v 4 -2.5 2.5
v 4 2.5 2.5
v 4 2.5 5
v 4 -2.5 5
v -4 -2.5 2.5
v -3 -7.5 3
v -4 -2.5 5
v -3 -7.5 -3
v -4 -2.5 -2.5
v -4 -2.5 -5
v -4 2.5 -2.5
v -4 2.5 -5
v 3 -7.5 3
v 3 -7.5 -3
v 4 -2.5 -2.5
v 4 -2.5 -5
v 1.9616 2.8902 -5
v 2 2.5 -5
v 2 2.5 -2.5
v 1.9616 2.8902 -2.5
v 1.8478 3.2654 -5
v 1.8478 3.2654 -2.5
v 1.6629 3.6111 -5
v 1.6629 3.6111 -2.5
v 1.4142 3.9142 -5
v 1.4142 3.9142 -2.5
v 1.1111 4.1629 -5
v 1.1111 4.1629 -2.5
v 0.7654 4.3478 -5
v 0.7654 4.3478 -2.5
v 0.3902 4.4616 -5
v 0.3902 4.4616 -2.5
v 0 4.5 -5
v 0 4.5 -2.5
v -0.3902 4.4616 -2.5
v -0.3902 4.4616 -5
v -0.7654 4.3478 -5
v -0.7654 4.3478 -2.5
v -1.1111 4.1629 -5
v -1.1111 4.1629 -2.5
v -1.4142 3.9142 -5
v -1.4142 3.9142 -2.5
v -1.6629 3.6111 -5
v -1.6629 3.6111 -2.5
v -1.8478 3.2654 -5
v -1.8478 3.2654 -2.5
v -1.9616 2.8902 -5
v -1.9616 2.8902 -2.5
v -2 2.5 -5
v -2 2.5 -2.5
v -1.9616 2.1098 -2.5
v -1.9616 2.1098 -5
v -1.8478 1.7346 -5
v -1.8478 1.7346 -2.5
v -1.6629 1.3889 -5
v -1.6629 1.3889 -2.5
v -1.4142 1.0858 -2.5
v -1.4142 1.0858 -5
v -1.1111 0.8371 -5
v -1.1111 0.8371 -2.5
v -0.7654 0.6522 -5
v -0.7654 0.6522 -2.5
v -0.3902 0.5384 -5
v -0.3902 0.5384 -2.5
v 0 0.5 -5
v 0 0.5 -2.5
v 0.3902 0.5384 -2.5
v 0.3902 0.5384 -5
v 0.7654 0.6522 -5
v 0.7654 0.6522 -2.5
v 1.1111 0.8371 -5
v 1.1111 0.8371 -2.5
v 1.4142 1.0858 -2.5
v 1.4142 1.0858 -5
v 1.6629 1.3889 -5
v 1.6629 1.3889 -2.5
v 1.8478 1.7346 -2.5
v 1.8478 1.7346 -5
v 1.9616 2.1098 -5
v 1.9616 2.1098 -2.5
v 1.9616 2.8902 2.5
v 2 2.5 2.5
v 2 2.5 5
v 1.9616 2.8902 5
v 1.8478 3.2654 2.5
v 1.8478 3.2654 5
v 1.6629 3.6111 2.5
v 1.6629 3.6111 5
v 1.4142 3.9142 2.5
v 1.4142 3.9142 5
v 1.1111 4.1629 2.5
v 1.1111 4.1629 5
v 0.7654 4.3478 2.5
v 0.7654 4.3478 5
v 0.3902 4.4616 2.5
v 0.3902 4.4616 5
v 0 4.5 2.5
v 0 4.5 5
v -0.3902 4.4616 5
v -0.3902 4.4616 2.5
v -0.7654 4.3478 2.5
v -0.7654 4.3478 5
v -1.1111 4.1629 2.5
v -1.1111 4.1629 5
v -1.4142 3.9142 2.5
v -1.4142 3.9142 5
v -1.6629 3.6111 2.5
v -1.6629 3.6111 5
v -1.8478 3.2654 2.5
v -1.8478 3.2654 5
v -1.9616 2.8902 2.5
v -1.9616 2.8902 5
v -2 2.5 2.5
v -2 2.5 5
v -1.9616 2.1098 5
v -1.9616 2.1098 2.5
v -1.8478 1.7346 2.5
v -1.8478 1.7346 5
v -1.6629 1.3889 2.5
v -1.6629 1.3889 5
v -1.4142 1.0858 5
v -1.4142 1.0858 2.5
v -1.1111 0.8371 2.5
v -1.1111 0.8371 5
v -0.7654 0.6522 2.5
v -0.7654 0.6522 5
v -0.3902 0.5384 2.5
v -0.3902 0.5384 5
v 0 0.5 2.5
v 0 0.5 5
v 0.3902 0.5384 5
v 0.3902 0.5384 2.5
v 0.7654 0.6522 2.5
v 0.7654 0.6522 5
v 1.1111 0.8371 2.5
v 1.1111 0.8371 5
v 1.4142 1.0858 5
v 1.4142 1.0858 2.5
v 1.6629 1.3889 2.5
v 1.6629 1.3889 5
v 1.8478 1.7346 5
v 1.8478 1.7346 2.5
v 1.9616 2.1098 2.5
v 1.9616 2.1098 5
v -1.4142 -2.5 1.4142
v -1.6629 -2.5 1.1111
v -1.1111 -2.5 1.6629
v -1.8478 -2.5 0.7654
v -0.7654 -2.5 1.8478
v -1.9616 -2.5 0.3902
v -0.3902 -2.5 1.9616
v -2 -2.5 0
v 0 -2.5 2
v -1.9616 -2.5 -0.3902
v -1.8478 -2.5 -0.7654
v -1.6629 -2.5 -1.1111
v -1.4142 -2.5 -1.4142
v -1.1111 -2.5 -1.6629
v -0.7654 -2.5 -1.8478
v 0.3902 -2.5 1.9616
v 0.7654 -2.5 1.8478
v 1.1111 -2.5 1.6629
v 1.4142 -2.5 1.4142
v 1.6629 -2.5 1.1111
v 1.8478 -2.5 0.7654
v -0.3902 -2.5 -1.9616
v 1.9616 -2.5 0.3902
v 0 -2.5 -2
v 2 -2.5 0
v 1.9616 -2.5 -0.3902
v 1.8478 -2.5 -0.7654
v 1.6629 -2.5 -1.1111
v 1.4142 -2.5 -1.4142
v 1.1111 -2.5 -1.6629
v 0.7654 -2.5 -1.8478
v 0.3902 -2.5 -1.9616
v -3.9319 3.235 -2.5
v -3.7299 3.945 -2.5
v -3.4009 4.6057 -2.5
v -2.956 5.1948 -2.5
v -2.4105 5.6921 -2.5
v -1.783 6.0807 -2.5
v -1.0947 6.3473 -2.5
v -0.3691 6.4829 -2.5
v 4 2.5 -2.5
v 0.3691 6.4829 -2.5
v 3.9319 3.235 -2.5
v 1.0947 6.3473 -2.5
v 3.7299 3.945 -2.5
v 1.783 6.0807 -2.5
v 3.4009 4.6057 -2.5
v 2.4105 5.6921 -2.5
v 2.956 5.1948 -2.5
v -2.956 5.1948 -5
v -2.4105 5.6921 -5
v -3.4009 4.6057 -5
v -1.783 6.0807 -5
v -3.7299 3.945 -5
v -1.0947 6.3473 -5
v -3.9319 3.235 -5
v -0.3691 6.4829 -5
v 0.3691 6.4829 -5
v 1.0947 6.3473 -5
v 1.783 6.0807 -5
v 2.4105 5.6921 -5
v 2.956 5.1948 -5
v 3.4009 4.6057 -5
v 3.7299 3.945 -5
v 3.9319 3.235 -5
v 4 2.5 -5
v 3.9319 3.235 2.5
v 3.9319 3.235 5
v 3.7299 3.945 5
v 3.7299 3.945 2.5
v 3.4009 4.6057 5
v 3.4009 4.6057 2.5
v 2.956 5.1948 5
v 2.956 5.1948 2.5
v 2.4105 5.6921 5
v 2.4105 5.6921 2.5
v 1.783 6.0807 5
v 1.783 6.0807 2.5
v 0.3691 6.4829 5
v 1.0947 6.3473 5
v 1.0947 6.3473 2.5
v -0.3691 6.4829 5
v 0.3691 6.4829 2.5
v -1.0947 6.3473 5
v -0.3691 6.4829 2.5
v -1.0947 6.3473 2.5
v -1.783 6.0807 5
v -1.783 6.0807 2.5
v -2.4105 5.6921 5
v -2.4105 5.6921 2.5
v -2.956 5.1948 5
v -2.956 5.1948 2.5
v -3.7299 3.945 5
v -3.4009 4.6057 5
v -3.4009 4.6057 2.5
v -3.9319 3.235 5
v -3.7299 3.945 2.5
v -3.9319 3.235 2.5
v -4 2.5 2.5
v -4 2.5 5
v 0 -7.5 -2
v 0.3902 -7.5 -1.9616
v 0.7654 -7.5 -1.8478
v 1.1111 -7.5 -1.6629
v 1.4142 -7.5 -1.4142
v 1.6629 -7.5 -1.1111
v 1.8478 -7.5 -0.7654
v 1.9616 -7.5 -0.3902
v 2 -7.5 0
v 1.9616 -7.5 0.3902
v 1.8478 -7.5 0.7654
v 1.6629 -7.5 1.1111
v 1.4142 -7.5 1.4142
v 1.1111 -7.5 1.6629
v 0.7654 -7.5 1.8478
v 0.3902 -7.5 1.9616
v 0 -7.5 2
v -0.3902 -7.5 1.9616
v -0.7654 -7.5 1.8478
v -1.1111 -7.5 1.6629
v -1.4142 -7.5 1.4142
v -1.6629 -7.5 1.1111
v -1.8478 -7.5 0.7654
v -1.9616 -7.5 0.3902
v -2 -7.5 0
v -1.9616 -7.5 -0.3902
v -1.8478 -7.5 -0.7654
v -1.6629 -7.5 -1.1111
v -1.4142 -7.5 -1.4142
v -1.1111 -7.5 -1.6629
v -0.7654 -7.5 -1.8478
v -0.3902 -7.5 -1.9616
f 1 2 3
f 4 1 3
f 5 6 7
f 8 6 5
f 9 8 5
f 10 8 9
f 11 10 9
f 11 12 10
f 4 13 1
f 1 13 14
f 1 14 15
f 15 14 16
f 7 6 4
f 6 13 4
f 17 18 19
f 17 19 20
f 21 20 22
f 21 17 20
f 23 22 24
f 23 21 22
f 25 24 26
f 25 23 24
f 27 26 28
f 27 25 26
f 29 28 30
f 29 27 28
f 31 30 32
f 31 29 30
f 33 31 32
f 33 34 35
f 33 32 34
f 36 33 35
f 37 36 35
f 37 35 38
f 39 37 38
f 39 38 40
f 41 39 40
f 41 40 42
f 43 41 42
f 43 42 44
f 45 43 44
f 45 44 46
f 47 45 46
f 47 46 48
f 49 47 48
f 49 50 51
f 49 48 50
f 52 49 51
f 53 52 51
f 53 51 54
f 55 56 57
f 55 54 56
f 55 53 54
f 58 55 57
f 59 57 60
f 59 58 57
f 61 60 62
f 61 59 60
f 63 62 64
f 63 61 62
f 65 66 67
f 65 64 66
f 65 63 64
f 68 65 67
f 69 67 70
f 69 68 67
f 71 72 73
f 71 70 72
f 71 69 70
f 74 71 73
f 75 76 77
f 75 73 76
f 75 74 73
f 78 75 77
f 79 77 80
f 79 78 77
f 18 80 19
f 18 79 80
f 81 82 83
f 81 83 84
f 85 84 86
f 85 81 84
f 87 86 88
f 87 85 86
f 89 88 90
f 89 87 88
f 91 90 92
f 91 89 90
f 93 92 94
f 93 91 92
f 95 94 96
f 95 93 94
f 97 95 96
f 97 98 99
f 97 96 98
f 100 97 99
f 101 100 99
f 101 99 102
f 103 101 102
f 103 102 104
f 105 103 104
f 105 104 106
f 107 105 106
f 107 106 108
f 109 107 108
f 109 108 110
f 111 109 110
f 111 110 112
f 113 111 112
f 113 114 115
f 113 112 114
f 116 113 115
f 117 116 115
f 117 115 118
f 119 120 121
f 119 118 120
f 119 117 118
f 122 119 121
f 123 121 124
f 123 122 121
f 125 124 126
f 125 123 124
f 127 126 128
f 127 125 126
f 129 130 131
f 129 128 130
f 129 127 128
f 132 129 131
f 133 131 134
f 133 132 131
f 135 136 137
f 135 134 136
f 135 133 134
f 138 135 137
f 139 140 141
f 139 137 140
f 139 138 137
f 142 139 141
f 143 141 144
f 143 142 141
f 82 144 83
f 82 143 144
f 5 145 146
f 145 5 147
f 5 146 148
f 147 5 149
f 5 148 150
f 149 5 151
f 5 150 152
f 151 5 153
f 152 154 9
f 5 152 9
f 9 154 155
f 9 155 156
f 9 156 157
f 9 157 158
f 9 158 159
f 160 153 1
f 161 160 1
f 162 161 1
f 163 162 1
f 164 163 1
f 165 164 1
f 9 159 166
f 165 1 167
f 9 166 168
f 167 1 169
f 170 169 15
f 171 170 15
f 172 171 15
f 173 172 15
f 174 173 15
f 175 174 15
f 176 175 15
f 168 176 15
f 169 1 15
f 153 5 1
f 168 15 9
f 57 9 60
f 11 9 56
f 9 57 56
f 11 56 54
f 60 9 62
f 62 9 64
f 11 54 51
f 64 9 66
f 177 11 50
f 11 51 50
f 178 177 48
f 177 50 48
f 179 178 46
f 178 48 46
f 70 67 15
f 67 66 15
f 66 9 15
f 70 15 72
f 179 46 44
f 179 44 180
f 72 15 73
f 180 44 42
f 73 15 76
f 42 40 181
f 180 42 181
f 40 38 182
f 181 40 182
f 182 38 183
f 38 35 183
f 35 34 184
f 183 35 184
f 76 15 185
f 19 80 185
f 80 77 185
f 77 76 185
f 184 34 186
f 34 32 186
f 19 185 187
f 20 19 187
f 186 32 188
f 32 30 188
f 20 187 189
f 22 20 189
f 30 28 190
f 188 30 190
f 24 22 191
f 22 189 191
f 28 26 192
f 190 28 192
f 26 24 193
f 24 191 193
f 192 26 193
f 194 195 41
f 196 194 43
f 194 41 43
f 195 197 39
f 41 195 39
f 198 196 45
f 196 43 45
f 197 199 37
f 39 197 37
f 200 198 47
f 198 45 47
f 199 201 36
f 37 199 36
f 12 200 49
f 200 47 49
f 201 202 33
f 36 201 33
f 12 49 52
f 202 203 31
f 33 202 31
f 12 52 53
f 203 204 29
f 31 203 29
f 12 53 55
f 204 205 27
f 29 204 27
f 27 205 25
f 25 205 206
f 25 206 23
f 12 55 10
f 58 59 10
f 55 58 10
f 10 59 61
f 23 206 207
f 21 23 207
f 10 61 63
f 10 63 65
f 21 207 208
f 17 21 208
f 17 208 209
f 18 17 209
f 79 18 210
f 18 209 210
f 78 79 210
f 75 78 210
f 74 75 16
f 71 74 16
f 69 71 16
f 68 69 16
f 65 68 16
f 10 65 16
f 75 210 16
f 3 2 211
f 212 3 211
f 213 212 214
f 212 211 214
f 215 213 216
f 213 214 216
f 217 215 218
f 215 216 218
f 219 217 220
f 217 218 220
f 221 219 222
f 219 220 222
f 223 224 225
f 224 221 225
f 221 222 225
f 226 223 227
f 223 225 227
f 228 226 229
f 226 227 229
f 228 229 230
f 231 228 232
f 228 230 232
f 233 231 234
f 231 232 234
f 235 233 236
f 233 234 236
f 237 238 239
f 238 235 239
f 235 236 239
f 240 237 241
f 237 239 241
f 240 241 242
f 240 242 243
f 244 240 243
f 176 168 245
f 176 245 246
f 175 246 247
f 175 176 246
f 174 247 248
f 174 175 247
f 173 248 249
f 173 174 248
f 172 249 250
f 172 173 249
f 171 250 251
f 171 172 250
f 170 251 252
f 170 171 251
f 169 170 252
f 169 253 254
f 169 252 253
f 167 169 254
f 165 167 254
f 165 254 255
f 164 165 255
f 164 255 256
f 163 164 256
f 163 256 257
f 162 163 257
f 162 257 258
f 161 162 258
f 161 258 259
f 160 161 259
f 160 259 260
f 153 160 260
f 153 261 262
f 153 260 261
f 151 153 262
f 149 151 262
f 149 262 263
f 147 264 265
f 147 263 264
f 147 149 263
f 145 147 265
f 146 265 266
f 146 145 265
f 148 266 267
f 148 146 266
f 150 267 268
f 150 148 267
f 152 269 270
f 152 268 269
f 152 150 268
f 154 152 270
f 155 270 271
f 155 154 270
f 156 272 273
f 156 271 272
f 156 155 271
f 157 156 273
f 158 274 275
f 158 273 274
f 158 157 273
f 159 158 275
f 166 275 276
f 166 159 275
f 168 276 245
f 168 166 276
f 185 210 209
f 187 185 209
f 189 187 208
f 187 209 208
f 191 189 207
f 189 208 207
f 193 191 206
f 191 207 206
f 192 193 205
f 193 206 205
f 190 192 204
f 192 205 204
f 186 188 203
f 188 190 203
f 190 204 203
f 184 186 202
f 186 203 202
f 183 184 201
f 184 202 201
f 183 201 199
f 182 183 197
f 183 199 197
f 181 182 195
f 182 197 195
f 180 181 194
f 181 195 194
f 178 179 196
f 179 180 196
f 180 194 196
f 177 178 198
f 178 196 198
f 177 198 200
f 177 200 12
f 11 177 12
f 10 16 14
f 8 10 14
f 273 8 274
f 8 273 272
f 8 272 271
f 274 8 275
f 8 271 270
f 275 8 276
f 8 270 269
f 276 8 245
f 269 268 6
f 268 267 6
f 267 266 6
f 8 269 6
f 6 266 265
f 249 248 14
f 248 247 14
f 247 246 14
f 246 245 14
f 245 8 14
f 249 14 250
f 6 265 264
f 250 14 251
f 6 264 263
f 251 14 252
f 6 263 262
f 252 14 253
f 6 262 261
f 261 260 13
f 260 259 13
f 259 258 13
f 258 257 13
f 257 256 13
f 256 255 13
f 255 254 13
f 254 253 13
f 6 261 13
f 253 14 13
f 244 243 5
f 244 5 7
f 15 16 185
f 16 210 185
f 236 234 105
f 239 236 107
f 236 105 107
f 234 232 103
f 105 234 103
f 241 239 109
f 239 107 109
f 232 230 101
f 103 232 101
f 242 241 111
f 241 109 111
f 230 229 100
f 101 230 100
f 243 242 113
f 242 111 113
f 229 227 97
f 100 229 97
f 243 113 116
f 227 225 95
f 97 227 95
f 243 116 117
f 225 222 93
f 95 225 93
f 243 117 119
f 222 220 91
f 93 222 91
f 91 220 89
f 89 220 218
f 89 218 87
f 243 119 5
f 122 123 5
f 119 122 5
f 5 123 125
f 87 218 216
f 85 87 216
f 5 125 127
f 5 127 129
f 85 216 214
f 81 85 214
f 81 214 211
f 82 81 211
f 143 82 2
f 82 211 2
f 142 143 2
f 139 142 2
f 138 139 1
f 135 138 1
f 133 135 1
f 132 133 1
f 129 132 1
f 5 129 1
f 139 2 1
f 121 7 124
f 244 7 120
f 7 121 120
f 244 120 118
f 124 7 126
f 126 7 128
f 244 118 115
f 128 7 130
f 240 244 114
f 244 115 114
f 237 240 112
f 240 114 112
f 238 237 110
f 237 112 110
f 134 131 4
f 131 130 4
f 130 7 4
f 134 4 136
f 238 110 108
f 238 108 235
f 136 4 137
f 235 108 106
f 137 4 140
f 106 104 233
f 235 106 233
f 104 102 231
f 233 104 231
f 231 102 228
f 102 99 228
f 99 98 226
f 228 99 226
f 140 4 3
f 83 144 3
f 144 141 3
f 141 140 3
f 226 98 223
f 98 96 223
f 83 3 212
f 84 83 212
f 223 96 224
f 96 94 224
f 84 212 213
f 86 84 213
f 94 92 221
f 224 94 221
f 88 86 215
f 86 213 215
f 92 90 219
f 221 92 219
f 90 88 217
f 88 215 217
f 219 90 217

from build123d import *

# Parameters (mm, degrees)
BOSS_EXTRUDE1_DEPTH     = 4
CUT_EXTRUDE1_DEPTH      = 14.124404748
CUT_EXTRUDE1_DEPTH_BACK = 14.124404748
SKETCH2_R               = 2
CUT_EXTRUDE2_DEPTH      = 14.124404748
CUT_EXTRUDE2_DEPTH_BACK = 14.124404748
CUT_EXTRUDE3_DEPTH      = 10.861541462
CUT_EXTRUDE3_DEPTH_BACK = 10.861541462
CUT_EXTRUDE4_DEPTH      = 16.394804318
CUT_EXTRUDE4_DEPTH_BACK = 16.394804318
SKETCH8_R               = 2


with BuildPart() as part:
    # Sketch1 → Boss-Extrude1 (new, symmetric)
    with BuildSketch(Plane(origin=(0, 0, 0), x_dir=(0, 0, -1), z_dir=(1, 0, 0))):
        Polygon((2.5, 7.5), (5, 7.5), (5, -2.5), (3, -7.5), (-3, -7.5), (-5, -2.5), (-5, 7.5), (-2.5, 7.5), (-2.5, -2.5), (2.5, -2.5), align=None)
    extrude(amount=BOSS_EXTRUDE1_DEPTH, both=True)

    # Sketch2 → Cut-Extrude1 (cut, two sides: drawn at the far end of the back side and taken through both)
    with BuildSketch(Plane.XY.offset(5).offset(-CUT_EXTRUDE1_DEPTH_BACK)):
        with Locations((0, 2.5)):
            Circle(SKETCH2_R)
    extrude(amount=CUT_EXTRUDE1_DEPTH + CUT_EXTRUDE1_DEPTH_BACK, mode=Mode.SUBTRACT)

    # Sketch3 → Cut-Extrude2 (cut, two sides: drawn at the far end of the back side and taken through both)
    with BuildSketch(Plane.XY.offset(5).offset(-CUT_EXTRUDE2_DEPTH_BACK)):
        with BuildLine():
            Line((-4, 2.5), (-4, 7.5))
            Line((-4, 7.5), (4, 7.5))
            Line((4, 7.5), (4, 2.5))
            ThreePointArc((4, 2.5), (0, 6.5), (-4, 2.5))
        make_face()
    extrude(amount=CUT_EXTRUDE2_DEPTH + CUT_EXTRUDE2_DEPTH_BACK, mode=Mode.SUBTRACT)

    # Sketch5 → Cut-Extrude3 (cut, two sides: drawn at the far end of the back side and taken through both)
    with BuildSketch(Plane.XY.offset(-CUT_EXTRUDE3_DEPTH_BACK)):
        Polygon((-4, -2.5), (-4, -7.5), (-3, -7.5), align=None)
        Polygon((3, -7.5), (4, -2.5), (4, -7.5), align=None)
    extrude(amount=CUT_EXTRUDE3_DEPTH + CUT_EXTRUDE3_DEPTH_BACK, mode=Mode.SUBTRACT)

    # Sketch8 → Cut-Extrude4 (cut, two sides: drawn at the far end of the back side and taken through both)
    with BuildSketch(Plane.XZ.offset(7.5).offset(-CUT_EXTRUDE4_DEPTH_BACK)):
        with Locations(Location((0, 0, 0), (0, 0, 270))):
            Circle(SKETCH8_R)
    extrude(amount=CUT_EXTRUDE4_DEPTH + CUT_EXTRUDE4_DEPTH_BACK, mode=Mode.SUBTRACT)


solid = part.part
